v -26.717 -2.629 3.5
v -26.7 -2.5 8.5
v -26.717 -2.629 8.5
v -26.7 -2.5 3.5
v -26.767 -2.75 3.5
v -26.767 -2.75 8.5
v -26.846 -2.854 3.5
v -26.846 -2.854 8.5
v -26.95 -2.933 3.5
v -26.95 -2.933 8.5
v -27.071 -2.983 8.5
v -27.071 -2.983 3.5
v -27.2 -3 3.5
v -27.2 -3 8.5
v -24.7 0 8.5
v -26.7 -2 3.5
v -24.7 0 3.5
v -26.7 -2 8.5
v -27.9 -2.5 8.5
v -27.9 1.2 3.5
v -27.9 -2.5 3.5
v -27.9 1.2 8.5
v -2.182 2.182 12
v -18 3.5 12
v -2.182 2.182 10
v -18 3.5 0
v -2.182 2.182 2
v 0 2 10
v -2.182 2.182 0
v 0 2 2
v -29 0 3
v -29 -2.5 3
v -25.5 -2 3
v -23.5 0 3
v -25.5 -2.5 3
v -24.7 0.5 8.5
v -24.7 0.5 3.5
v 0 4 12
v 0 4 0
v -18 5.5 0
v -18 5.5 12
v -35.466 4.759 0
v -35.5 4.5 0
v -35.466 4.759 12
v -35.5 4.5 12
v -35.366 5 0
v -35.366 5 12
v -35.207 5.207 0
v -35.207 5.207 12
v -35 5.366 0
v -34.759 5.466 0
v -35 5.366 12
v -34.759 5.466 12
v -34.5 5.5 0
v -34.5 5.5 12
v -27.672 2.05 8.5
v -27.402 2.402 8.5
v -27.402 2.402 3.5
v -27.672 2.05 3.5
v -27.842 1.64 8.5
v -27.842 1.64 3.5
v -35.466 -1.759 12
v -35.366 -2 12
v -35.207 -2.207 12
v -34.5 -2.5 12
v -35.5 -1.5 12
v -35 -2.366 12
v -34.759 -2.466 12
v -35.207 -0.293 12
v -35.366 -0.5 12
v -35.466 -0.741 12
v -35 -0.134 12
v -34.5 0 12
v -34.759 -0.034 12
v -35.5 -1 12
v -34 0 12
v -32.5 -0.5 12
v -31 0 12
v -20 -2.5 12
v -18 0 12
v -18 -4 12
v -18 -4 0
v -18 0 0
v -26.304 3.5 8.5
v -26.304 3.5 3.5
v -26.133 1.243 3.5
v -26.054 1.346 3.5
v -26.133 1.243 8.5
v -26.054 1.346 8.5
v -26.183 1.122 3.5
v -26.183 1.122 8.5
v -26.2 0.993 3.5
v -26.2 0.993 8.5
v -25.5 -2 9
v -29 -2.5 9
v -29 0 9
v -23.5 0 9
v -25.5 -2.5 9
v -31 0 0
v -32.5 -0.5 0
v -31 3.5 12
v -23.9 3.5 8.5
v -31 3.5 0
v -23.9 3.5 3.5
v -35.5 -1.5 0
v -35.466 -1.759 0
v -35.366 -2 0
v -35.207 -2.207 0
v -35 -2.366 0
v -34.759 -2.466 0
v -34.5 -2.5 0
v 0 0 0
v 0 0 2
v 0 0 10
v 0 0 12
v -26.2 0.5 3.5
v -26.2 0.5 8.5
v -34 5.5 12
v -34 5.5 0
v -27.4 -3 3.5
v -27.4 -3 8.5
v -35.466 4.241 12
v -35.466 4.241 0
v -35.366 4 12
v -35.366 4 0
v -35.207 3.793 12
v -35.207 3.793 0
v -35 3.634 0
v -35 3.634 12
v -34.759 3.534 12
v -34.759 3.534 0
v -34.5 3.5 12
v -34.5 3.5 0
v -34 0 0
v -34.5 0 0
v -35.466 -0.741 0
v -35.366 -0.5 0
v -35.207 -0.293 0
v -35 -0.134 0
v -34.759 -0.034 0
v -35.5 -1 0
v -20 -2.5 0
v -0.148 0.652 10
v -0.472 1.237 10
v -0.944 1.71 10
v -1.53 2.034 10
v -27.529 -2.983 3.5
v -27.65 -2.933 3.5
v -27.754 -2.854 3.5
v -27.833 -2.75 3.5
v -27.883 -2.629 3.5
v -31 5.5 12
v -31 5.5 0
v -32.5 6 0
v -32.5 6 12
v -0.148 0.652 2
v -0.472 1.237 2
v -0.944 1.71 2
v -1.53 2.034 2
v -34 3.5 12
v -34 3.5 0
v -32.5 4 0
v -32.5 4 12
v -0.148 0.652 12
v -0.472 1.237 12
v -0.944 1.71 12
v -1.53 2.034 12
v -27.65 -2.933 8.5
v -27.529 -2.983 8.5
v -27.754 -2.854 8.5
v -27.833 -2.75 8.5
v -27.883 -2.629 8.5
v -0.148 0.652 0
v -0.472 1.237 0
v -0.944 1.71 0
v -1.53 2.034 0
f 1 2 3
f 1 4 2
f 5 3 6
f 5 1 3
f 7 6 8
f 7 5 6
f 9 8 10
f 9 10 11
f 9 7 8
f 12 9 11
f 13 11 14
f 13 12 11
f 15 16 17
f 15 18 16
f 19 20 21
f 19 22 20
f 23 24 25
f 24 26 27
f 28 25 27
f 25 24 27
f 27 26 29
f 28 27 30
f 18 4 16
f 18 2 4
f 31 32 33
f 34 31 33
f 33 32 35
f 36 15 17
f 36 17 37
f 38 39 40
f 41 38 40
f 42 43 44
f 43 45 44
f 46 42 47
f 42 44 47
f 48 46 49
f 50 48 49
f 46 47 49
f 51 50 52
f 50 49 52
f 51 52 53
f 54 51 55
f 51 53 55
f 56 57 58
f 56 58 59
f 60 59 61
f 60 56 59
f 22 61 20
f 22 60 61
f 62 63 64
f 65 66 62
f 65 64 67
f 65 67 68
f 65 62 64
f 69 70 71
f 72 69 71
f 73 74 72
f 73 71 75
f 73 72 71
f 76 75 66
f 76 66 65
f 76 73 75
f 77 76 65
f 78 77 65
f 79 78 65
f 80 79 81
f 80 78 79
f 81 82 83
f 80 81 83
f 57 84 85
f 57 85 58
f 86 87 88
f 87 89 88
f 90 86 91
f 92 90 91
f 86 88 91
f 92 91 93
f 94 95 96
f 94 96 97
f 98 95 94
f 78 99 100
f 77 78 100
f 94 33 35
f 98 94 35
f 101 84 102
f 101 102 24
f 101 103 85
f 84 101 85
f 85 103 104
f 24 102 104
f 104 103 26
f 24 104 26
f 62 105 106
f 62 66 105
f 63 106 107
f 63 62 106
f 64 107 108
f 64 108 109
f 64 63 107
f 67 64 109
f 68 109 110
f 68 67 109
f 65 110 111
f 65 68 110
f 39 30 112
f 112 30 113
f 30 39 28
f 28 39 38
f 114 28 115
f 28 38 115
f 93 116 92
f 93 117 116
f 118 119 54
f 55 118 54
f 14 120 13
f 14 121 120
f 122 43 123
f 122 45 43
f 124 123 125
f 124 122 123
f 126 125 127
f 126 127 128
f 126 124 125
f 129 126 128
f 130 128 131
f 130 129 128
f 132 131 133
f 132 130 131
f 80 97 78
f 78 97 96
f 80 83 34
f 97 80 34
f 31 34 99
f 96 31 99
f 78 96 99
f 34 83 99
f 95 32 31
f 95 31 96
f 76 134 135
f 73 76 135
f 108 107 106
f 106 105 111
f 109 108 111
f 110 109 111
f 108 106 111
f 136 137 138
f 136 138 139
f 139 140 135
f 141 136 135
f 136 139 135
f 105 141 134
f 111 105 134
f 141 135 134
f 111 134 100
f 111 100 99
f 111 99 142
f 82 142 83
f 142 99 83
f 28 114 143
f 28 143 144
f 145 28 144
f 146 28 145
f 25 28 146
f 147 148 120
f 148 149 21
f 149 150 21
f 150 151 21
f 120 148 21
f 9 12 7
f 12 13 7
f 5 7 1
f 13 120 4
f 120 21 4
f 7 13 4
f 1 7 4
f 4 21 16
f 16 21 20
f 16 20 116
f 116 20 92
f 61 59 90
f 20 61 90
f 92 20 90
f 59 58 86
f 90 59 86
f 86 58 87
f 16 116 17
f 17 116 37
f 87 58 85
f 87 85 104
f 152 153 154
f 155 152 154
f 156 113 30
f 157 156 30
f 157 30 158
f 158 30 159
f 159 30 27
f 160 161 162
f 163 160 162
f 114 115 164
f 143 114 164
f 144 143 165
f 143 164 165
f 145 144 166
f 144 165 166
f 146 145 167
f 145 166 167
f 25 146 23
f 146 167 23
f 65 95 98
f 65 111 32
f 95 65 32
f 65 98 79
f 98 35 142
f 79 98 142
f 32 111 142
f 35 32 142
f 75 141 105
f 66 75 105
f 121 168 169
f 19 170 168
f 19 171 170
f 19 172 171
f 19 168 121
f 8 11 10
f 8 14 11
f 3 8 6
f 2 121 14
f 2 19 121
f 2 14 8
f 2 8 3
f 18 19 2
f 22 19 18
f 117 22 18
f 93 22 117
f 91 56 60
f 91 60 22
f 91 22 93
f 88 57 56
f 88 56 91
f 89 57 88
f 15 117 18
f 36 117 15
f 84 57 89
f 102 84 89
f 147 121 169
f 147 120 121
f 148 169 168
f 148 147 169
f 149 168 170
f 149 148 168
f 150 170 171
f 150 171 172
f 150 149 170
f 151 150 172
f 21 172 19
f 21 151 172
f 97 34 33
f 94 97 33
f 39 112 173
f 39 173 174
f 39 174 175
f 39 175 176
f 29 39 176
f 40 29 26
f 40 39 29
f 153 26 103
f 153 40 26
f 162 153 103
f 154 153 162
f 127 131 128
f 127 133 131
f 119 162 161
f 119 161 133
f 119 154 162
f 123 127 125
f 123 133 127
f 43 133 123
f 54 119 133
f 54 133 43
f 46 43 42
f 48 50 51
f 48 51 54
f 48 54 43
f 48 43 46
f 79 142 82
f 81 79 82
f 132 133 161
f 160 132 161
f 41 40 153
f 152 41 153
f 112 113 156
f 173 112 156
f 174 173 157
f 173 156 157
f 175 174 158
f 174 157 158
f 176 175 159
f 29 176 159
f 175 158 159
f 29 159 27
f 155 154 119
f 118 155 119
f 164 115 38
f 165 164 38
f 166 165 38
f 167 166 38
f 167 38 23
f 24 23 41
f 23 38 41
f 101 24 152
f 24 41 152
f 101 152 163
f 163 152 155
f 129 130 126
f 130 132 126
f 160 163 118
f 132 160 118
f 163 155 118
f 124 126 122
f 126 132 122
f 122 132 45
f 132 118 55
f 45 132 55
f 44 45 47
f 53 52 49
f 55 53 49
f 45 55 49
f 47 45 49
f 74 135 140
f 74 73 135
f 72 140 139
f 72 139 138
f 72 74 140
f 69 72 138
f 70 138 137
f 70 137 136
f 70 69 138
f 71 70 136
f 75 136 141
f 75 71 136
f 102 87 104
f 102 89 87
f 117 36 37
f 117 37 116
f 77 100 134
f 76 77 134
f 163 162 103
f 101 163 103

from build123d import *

# Parameters (mm, degrees)
BOSS_EXTRUDE1_DEPTH   = 12
BOSS_EXTRUDE1_2_DEPTH = 12
SKETCH2_W             = 5.5
SKETCH2_H             = 6
CUT_EXTRUDE1_DEPTH    = 3
BOSS_EXTRUDE2_DEPTH   = 6
BOSS_EXTRUDE3_START   = -6
BOSS_EXTRUDE3_DEPTH   = 2.5
FILLET7_R             = 1
FILLET8_R             = 1
FILLET10_R            = 1
FILLET11_R            = 1
BOSS_EXTRUDE4_DEPTH   = 2
BOSS_EXTRUDE5_START   = -10
BOSS_EXTRUDE5_DEPTH   = 2
FILLET12_R            = 0.5
FILLET13_R            = 0.5


with BuildPart() as part:
    # Sketch1 → Boss-Extrude1 (new body)
    with BuildSketch(Plane.XY):
        Polygon((0, 4), (-18, 5.5), (-31, 5.5), (-32.5, 6), (-34, 5.5), (-35.5, 5.5), (-35.5, 3.5), (-34, 3.5), (-32.5, 4), (-31, 3.5), (-18, 3.5), (0, 2), align=None)
    extrude(amount=BOSS_EXTRUDE1_DEPTH)

    # Sketch4 → Boss-Extrude3 (add, symmetric)
    with BuildSketch(Plane.XY.offset(12).offset(BOSS_EXTRUDE3_START)):
        with BuildLine():
            Line((-26.7, -2), (-24.7, 0))
            Line((-24.7, 0), (-24.7, 0.5))
            Line((-24.7, 0.5), (-26.2, 0.5))
            Line((-26.2, 0.5), (-26.2, 1.2))
            Line((-26.2, 1.2), (-23.9, 3.5))
            Line((-23.9, 3.5), (-26.304163056, 3.5))
            Line((-26.304163056, 3.5), (-27.402081528, 2.402081528))
            ThreePointArc((-27.402081528, 2.402081528), (-27.770595205, 1.850561835), (-27.9, 1.2))
            Line((-27.9, 1.2), (-27.9, -3))
            Line((-27.9, -3), (-26.7, -3))
            Line((-26.7, -3), (-26.7, -2))
        make_face()
    extrude(amount=BOSS_EXTRUDE3_DEPTH, both=True)

    # Fillet8
    fillet8_edges = [part.edges().sort_by_distance(p)[0] for p in [
        (-35.5, 3.5, 6),
    ]]
    fillet(fillet8_edges, radius=FILLET8_R)

    # Fillet10
    fillet10_edges = [part.edges().sort_by_distance(p)[0] for p in [
        (-35.5, 5.5, 6),
    ]]
    fillet(fillet10_edges, radius=FILLET10_R - 0.0001)  # a hair under: the kernel refuses the full size

    # Sketch5 → Boss-Extrude4 (add)
    with BuildSketch(Plane.XY.offset(12)):
        with BuildLine():
            Line((0, 2), (0, 0))
            ThreePointArc((0, 0), (-0.691300526, 1.490517656), (-2.181818182, 2.181818182))
            Line((-2.181818182, 2.181818182), (0, 2))
        make_face()
    extrude(amount=-BOSS_EXTRUDE4_DEPTH)

    # Sketch5<2> → Boss-Extrude5 (add)
    with BuildSketch(Plane.XY.offset(12).offset(BOSS_EXTRUDE5_START)):
        with BuildLine():
            Line((0, 2), (0, 0))
            ThreePointArc((0, 0), (-0.691300526, 1.490517656), (-2.181818182, 2.181818182))
            Line((-2.181818182, 2.181818182), (0, 2))
        make_face()
    extrude(amount=-BOSS_EXTRUDE5_DEPTH)

    # Fillet12
    fillet12_edges = [part.edges().sort_by_distance(p)[0] for p in [
        (-26.7, -3, 6),
        (-27.9, -3, 6),
    ]]
    fillet(fillet12_edges, radius=FILLET12_R)

    # Fillet13
    fillet13_edges = [part.edges().sort_by_distance(p)[0] for p in [
        (-26.2, 1.2, 6),
    ]]
    fillet(fillet13_edges, radius=FILLET13_R)


with BuildPart() as body_2:
    # Sketch1 → Boss-Extrude1 2 (new body)
    with BuildSketch(Plane.XY):
        Polygon((-35.5, -2.5), (-20, -2.5), (-18, -4), (-18, 0), (-31, 0), (-32.5, -0.5), (-34, 0), (-35.5, 0), align=None)
    extrude(amount=BOSS_EXTRUDE1_2_DEPTH)

    # Sketch2 → Cut-Extrude1 (cut)
    with BuildSketch(Plane.XZ.offset(2.5)):
        with Locations((-26.25, 6)):
            Rectangle(SKETCH2_W, SKETCH2_H)
    extrude(amount=-CUT_EXTRUDE1_DEPTH, mode=Mode.SUBTRACT)

    # Sketch3 → Boss-Extrude2 (add)
    with BuildSketch(Plane.XY.offset(3)):
        Polygon((-23.5, 0), (-25.5, -2), (-25.5, -2.5), (-23.5, -2.5), align=None)
    extrude(amount=BOSS_EXTRUDE2_DEPTH)

    # Fillet7
    fillet7_edges = [body_2.edges().sort_by_distance(p)[0] for p in [
        (-35.5, 0, 6),
    ]]
    fillet(fillet7_edges, radius=FILLET7_R)

    # Fillet11
    fillet11_edges = [body_2.edges().sort_by_distance(p)[0] for p in [
        (-35.5, -2.5, 6),
    ]]
    fillet(fillet11_edges, radius=FILLET11_R)


solid = Compound([part.part, body_2.part])
